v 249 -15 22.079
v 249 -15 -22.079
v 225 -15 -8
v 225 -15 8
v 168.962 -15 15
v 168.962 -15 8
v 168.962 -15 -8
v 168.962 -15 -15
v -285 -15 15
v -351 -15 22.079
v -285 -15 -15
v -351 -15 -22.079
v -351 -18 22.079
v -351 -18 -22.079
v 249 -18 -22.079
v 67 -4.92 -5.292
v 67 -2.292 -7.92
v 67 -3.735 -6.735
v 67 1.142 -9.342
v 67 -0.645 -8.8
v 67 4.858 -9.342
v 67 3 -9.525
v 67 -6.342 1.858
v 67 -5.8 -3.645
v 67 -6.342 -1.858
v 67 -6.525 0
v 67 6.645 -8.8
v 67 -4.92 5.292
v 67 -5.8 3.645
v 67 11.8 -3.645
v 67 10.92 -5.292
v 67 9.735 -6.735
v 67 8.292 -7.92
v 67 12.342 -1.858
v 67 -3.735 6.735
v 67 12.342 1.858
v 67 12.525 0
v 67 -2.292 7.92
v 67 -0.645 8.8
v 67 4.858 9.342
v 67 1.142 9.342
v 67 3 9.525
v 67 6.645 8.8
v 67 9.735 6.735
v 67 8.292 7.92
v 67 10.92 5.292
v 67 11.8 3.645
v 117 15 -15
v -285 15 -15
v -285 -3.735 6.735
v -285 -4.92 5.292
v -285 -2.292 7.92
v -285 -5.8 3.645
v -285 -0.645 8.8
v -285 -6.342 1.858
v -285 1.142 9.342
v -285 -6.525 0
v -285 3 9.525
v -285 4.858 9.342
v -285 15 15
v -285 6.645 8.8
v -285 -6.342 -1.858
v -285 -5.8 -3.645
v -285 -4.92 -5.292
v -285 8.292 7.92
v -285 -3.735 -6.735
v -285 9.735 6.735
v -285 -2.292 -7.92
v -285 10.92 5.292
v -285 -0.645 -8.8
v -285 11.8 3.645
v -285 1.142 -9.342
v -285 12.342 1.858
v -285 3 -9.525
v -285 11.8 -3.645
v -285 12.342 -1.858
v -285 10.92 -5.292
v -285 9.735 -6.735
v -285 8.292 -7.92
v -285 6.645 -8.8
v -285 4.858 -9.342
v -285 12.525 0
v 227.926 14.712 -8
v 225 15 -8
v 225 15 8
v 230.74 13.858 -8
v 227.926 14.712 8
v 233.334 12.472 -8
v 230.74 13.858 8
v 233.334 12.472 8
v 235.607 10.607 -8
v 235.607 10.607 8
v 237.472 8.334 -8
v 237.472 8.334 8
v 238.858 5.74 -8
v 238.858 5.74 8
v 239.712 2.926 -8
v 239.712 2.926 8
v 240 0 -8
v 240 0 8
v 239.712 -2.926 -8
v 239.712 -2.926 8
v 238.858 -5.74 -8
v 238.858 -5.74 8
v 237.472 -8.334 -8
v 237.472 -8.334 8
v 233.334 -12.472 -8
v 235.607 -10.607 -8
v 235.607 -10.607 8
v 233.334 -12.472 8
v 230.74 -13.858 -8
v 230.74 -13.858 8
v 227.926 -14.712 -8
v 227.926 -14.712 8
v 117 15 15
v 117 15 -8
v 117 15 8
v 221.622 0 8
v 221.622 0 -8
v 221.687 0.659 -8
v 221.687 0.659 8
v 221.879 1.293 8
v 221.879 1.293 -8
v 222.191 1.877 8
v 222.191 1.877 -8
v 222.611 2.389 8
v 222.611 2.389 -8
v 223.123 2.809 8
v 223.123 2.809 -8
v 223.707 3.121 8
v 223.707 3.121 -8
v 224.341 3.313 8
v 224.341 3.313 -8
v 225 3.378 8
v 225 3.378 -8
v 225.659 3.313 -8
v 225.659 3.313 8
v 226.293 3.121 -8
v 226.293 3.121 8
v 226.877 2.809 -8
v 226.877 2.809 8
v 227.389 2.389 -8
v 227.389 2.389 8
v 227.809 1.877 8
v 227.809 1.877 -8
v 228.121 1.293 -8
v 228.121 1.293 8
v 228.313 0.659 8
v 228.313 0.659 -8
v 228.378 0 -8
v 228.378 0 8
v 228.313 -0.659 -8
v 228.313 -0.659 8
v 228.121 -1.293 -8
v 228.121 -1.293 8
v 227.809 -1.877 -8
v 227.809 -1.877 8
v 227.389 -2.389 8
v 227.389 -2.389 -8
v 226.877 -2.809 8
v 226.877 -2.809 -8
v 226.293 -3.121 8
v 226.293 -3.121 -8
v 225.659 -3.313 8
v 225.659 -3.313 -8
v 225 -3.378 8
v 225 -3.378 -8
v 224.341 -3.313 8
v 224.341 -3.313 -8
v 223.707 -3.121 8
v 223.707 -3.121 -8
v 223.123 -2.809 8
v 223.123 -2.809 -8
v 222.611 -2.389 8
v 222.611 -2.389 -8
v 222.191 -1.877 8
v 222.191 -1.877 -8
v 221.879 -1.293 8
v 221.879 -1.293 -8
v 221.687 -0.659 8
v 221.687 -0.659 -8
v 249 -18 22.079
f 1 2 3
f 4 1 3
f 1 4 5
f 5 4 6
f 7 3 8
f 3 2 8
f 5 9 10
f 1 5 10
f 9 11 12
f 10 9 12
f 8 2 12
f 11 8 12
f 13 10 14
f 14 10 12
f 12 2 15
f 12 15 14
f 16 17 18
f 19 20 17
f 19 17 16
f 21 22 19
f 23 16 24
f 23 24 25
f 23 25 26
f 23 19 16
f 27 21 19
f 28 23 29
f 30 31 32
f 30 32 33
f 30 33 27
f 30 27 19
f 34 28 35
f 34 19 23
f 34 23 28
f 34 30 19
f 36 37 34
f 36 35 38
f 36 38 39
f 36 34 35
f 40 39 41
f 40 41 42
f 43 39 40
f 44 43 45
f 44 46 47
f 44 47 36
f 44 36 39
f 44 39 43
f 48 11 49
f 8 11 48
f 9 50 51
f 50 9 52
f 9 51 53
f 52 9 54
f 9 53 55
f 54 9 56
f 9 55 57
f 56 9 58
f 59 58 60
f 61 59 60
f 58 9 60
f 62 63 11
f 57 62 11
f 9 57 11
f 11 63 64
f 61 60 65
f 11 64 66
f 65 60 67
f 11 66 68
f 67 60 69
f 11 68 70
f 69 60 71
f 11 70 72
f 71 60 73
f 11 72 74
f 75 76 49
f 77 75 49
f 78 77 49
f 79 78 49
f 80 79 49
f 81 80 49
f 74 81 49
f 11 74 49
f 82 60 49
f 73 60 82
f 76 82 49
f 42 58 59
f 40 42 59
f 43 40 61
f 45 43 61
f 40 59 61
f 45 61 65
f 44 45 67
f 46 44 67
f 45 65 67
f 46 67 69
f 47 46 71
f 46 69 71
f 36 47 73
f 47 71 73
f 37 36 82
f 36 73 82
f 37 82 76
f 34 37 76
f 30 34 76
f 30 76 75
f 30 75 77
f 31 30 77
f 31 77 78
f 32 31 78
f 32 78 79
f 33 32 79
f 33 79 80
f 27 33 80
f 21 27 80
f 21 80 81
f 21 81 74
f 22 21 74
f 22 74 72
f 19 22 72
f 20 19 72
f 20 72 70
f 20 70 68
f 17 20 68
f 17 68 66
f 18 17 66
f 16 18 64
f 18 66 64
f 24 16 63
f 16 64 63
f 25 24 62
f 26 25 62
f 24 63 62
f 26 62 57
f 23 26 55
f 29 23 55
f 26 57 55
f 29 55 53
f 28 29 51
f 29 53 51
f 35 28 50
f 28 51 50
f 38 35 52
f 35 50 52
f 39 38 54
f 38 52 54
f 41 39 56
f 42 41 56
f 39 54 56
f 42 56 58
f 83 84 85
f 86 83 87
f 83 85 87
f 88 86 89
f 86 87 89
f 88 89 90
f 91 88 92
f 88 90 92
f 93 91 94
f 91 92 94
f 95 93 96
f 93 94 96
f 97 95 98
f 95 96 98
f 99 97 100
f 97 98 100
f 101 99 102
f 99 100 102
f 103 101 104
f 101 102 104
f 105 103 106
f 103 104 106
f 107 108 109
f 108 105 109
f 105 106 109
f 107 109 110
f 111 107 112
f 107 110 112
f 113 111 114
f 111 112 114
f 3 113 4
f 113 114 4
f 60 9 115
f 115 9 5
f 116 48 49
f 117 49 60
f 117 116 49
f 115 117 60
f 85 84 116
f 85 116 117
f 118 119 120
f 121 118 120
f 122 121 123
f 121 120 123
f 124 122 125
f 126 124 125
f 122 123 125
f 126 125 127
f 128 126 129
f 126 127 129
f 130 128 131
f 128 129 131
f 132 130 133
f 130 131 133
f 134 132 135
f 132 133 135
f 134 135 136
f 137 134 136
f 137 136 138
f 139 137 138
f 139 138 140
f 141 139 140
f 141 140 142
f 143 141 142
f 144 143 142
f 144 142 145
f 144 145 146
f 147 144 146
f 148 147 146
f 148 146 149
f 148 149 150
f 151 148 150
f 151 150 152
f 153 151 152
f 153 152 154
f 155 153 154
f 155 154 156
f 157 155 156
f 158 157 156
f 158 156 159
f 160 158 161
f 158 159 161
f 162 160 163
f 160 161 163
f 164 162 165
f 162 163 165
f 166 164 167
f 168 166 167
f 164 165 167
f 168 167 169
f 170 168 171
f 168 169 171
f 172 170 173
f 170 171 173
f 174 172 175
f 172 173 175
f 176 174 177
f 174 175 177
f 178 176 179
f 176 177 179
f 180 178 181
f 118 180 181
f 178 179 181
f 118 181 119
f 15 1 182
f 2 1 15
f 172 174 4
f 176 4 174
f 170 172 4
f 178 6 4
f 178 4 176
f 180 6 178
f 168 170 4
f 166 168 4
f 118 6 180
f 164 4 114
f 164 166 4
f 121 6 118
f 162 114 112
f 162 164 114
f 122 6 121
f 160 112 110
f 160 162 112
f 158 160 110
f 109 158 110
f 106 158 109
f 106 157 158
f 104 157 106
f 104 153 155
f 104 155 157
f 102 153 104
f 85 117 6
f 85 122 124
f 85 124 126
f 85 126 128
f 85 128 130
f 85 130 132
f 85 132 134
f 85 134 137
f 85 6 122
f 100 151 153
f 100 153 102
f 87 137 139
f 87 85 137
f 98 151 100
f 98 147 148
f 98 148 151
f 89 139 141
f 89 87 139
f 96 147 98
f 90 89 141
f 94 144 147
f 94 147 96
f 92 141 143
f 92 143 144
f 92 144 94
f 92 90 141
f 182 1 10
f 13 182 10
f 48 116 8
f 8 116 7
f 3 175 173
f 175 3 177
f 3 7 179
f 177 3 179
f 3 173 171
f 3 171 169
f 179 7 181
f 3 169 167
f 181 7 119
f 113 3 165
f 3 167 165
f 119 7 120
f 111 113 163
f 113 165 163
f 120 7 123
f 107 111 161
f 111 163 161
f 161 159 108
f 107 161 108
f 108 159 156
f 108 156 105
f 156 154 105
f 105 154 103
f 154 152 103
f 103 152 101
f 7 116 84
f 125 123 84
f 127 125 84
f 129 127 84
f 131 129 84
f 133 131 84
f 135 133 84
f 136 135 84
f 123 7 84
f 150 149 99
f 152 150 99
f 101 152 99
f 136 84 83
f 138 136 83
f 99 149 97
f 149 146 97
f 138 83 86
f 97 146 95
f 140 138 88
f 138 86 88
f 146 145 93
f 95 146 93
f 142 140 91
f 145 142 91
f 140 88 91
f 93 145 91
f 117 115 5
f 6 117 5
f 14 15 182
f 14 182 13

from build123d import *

# Parameters (mm, degrees)
BOSS_EXTRUDE1_DEPTH      = 15
H_0_266_DIAMETER_HOLE1_D = 6.7564
SKETCH5_W                = 40
SKETCH5_H                = 16
SKETCH5_H_2              = 20.916111238
CUT_EXTRUDE1_DEPTH       = 243.332416321
SKETCH6_W                = 429.036778435
SKETCH6_H                = 127.431795429
CUT_EXTRUDE2_DEPTH       = 243.332416321
SKETCH10_W               = 30
SKETCH10_H               = 30
BOSS_EXTRUDE3_DEPTH      = 500
SKETCH11_R               = 9.525
CUT_EXTRUDE4_DEPTH       = 400
SKETCH13_W               = 600
SKETCH13_H               = 44.158972604
BOSS_EXTRUDE4_DEPTH      = 3
SKETCH14_W               = 111.034909532
SKETCH14_H               = 112.185530356
CUT_EXTRUDE5_DEPTH       = 30
CHAMFER1_SIZE            = 100
CHAMFER1_SIZE_2          = 57.735026919


with BuildPart() as part:
    # Sketch1 → Boss-Extrude1 (new, symmetric)
    with BuildSketch(Plane.XY):
        with BuildLine():
            Line((-225, 15), (225, 15))
            ThreePointArc((225, 15), (240, 0), (225, -15))
            Line((225, -15), (-225, -15))
            ThreePointArc((-225, -15), (-240, 0), (-225, 15))
        make_face()
    extrude(amount=BOSS_EXTRUDE1_DEPTH, both=True)

    # H (0.266) Diameter Hole1 (through all)
    with Locations(Plane.XY.offset(15)):
        with Locations((-225, 0), (225, 0)):
            Hole(H_0_266_DIAMETER_HOLE1_D / 2)

    # Sketch5 → Cut-Extrude1 (cut, through all)
    with BuildSketch(Plane(origin=(0, 15, 0), x_dir=(1, 0, 0), z_dir=(0, 1, 0))):
        with Locations((-237, 0)):
            Rectangle(SKETCH5_W, SKETCH5_H)
        with Locations((237, 18.458055619)):
            Rectangle(SKETCH5_W, SKETCH5_H_2)
        with Locations((237, -18.458055619)):
            Rectangle(SKETCH5_W, SKETCH5_H_2)
    extrude(amount=-CUT_EXTRUDE1_DEPTH, mode=Mode.SUBTRACT)

    # Sketch6 → Cut-Extrude2 (cut, through all)
    with BuildSketch(Plane(origin=(0, 15, 0), x_dir=(1, 0, 0), z_dir=(0, 1, 0))):
        with Locations((-47.518389218, -4.674139215)):
            Rectangle(SKETCH6_W, SKETCH6_H)
    extrude(amount=-CUT_EXTRUDE2_DEPTH, mode=Mode.SUBTRACT)

    # Sketch10 → Boss-Extrude3 (add)
    with BuildSketch(Plane.ZY.offset(-167)):
        Rectangle(SKETCH10_W, SKETCH10_H)
    extrude(amount=BOSS_EXTRUDE3_DEPTH)

    # Sketch11 → Cut-Extrude4 (cut)
    with BuildSketch(Plane.ZY.offset(333)):
        with Locations((0, 3)):
            Circle(SKETCH11_R)
    extrude(amount=-CUT_EXTRUDE4_DEPTH, mode=Mode.SUBTRACT)

    # Sketch13 → Boss-Extrude4 (add)
    with BuildSketch(Plane(origin=(0, -15, 0), x_dir=(-1, 0, 0), z_dir=(0, -1, 0))):
        with Locations((51, 0)):
            Rectangle(SKETCH13_W, SKETCH13_H)
    extrude(amount=BOSS_EXTRUDE4_DEPTH)

    # Sketch14 → Cut-Extrude5 (cut)
    with BuildSketch(Plane(origin=(0, 15, 0), x_dir=(1, 0, 0), z_dir=(0, 1, 0))):
        with Locations((-340.517454766, -2.301241648)):
            Rectangle(SKETCH14_W, SKETCH14_H)
    extrude(amount=-CUT_EXTRUDE5_DEPTH, mode=Mode.SUBTRACT)

    # Chamfer1
    # the kernel refuses this chamfer: 100, 57.735026919 mm, written as the material it takes off along each edge
    with BuildSketch(Plane(origin=(217, 15, 250.708575465), x_dir=(-0.9998132206222079, 0.01932676561270057, 2.717178209496515e-15), z_dir=(0, 0, -1))) as chamfer1_piece_1_section:
        Polygon((CHAMFER1_SIZE * 0.999813220622, -CHAMFER1_SIZE * 0.0193267656127), (-CHAMFER1_SIZE_2 * 0.0193267656127, -CHAMFER1_SIZE_2 * 0.999813220622), (0, 0), align=None)
    chamfer1_piece_1 = extrude(amount=524.417150929, mode=Mode.PRIVATE)
    chamfer1_piece_1 = split(chamfer1_piece_1, bisect_by=Plane(origin=(178.470505911, -15, 11.5), z_dir=(0, 1, 0)), keep=Keep.TOP, mode=Mode.PRIVATE)
    chamfer1_piece_1 = split(chamfer1_piece_1, bisect_by=Plane(origin=(178.470505911, 1.75500065, 8), z_dir=(0, 0, 1)), keep=Keep.TOP, mode=Mode.PRIVATE)
    add(chamfer1_piece_1, mode=Mode.SUBTRACT)
    with BuildSketch(Plane(origin=(217, 15, -8), x_dir=(-0.9998132206222079, 0.019326765612700587, 2.717178209496515e-15), z_dir=(0, 0, -1))) as chamfer1_piece_2_section:
        Polygon((CHAMFER1_SIZE * 0.999813220622, -CHAMFER1_SIZE * 0.0193267656127), (-CHAMFER1_SIZE_2 * 0.0193267656127, -CHAMFER1_SIZE_2 * 0.999813220622), (0, 0), align=None)
    chamfer1_piece_2 = extrude(amount=265.708575465, mode=Mode.PRIVATE)
    chamfer1_piece_2 = split(chamfer1_piece_2, bisect_by=Plane(origin=(178.470505911, -15, -11.5), z_dir=(0, 1, 0)), keep=Keep.TOP, mode=Mode.PRIVATE)
    add(chamfer1_piece_2, mode=Mode.SUBTRACT)
    with BuildSketch(Plane(origin=(217, 15, -250.708575465), x_dir=(0.057893862402671484, -0.9983227437537925, 0), z_dir=(0, 0, 1))) as chamfer1_piece_3_section:
        Polygon((CHAMFER1_SIZE_2 * 0.998322743753, -CHAMFER1_SIZE_2 * 0.0578938624026), (-CHAMFER1_SIZE * 0.0578938624027, -CHAMFER1_SIZE * 0.998322743754), (0, 0), align=None)
    chamfer1_piece_3 = extrude(amount=524.417150929, mode=Mode.PRIVATE)
    chamfer1_piece_3 = split(chamfer1_piece_3, bisect_by=Plane(origin=(178.470505911, -15, -11.5), z_dir=(0, 1, 0)), keep=Keep.TOP, mode=Mode.PRIVATE)
    chamfer1_piece_3 = split(chamfer1_piece_3, bisect_by=Plane(origin=(178.470505911, 1.75500065, -8), z_dir=(0, 0, -1)), keep=Keep.TOP, mode=Mode.PRIVATE)
    add(chamfer1_piece_3, mode=Mode.SUBTRACT)
    with BuildSketch(Plane(origin=(217, 15, 8), x_dir=(0.05789386240267099, -0.9983227437537925, 0), z_dir=(0, 0, 1))) as chamfer1_piece_4_section:
        Polygon((CHAMFER1_SIZE_2 * 0.998322743753, -CHAMFER1_SIZE_2 * 0.0578938624026), (-CHAMFER1_SIZE * 0.0578938624027, -CHAMFER1_SIZE * 0.998322743754), (0, 0), align=None)
    chamfer1_piece_4 = extrude(amount=265.708575465, mode=Mode.PRIVATE)
    chamfer1_piece_4 = split(chamfer1_piece_4, bisect_by=Plane(origin=(178.470505911, -15, 11.5), z_dir=(0, 1, 0)), keep=Keep.TOP, mode=Mode.PRIVATE)
    add(chamfer1_piece_4, mode=Mode.SUBTRACT)


solid = part.part
